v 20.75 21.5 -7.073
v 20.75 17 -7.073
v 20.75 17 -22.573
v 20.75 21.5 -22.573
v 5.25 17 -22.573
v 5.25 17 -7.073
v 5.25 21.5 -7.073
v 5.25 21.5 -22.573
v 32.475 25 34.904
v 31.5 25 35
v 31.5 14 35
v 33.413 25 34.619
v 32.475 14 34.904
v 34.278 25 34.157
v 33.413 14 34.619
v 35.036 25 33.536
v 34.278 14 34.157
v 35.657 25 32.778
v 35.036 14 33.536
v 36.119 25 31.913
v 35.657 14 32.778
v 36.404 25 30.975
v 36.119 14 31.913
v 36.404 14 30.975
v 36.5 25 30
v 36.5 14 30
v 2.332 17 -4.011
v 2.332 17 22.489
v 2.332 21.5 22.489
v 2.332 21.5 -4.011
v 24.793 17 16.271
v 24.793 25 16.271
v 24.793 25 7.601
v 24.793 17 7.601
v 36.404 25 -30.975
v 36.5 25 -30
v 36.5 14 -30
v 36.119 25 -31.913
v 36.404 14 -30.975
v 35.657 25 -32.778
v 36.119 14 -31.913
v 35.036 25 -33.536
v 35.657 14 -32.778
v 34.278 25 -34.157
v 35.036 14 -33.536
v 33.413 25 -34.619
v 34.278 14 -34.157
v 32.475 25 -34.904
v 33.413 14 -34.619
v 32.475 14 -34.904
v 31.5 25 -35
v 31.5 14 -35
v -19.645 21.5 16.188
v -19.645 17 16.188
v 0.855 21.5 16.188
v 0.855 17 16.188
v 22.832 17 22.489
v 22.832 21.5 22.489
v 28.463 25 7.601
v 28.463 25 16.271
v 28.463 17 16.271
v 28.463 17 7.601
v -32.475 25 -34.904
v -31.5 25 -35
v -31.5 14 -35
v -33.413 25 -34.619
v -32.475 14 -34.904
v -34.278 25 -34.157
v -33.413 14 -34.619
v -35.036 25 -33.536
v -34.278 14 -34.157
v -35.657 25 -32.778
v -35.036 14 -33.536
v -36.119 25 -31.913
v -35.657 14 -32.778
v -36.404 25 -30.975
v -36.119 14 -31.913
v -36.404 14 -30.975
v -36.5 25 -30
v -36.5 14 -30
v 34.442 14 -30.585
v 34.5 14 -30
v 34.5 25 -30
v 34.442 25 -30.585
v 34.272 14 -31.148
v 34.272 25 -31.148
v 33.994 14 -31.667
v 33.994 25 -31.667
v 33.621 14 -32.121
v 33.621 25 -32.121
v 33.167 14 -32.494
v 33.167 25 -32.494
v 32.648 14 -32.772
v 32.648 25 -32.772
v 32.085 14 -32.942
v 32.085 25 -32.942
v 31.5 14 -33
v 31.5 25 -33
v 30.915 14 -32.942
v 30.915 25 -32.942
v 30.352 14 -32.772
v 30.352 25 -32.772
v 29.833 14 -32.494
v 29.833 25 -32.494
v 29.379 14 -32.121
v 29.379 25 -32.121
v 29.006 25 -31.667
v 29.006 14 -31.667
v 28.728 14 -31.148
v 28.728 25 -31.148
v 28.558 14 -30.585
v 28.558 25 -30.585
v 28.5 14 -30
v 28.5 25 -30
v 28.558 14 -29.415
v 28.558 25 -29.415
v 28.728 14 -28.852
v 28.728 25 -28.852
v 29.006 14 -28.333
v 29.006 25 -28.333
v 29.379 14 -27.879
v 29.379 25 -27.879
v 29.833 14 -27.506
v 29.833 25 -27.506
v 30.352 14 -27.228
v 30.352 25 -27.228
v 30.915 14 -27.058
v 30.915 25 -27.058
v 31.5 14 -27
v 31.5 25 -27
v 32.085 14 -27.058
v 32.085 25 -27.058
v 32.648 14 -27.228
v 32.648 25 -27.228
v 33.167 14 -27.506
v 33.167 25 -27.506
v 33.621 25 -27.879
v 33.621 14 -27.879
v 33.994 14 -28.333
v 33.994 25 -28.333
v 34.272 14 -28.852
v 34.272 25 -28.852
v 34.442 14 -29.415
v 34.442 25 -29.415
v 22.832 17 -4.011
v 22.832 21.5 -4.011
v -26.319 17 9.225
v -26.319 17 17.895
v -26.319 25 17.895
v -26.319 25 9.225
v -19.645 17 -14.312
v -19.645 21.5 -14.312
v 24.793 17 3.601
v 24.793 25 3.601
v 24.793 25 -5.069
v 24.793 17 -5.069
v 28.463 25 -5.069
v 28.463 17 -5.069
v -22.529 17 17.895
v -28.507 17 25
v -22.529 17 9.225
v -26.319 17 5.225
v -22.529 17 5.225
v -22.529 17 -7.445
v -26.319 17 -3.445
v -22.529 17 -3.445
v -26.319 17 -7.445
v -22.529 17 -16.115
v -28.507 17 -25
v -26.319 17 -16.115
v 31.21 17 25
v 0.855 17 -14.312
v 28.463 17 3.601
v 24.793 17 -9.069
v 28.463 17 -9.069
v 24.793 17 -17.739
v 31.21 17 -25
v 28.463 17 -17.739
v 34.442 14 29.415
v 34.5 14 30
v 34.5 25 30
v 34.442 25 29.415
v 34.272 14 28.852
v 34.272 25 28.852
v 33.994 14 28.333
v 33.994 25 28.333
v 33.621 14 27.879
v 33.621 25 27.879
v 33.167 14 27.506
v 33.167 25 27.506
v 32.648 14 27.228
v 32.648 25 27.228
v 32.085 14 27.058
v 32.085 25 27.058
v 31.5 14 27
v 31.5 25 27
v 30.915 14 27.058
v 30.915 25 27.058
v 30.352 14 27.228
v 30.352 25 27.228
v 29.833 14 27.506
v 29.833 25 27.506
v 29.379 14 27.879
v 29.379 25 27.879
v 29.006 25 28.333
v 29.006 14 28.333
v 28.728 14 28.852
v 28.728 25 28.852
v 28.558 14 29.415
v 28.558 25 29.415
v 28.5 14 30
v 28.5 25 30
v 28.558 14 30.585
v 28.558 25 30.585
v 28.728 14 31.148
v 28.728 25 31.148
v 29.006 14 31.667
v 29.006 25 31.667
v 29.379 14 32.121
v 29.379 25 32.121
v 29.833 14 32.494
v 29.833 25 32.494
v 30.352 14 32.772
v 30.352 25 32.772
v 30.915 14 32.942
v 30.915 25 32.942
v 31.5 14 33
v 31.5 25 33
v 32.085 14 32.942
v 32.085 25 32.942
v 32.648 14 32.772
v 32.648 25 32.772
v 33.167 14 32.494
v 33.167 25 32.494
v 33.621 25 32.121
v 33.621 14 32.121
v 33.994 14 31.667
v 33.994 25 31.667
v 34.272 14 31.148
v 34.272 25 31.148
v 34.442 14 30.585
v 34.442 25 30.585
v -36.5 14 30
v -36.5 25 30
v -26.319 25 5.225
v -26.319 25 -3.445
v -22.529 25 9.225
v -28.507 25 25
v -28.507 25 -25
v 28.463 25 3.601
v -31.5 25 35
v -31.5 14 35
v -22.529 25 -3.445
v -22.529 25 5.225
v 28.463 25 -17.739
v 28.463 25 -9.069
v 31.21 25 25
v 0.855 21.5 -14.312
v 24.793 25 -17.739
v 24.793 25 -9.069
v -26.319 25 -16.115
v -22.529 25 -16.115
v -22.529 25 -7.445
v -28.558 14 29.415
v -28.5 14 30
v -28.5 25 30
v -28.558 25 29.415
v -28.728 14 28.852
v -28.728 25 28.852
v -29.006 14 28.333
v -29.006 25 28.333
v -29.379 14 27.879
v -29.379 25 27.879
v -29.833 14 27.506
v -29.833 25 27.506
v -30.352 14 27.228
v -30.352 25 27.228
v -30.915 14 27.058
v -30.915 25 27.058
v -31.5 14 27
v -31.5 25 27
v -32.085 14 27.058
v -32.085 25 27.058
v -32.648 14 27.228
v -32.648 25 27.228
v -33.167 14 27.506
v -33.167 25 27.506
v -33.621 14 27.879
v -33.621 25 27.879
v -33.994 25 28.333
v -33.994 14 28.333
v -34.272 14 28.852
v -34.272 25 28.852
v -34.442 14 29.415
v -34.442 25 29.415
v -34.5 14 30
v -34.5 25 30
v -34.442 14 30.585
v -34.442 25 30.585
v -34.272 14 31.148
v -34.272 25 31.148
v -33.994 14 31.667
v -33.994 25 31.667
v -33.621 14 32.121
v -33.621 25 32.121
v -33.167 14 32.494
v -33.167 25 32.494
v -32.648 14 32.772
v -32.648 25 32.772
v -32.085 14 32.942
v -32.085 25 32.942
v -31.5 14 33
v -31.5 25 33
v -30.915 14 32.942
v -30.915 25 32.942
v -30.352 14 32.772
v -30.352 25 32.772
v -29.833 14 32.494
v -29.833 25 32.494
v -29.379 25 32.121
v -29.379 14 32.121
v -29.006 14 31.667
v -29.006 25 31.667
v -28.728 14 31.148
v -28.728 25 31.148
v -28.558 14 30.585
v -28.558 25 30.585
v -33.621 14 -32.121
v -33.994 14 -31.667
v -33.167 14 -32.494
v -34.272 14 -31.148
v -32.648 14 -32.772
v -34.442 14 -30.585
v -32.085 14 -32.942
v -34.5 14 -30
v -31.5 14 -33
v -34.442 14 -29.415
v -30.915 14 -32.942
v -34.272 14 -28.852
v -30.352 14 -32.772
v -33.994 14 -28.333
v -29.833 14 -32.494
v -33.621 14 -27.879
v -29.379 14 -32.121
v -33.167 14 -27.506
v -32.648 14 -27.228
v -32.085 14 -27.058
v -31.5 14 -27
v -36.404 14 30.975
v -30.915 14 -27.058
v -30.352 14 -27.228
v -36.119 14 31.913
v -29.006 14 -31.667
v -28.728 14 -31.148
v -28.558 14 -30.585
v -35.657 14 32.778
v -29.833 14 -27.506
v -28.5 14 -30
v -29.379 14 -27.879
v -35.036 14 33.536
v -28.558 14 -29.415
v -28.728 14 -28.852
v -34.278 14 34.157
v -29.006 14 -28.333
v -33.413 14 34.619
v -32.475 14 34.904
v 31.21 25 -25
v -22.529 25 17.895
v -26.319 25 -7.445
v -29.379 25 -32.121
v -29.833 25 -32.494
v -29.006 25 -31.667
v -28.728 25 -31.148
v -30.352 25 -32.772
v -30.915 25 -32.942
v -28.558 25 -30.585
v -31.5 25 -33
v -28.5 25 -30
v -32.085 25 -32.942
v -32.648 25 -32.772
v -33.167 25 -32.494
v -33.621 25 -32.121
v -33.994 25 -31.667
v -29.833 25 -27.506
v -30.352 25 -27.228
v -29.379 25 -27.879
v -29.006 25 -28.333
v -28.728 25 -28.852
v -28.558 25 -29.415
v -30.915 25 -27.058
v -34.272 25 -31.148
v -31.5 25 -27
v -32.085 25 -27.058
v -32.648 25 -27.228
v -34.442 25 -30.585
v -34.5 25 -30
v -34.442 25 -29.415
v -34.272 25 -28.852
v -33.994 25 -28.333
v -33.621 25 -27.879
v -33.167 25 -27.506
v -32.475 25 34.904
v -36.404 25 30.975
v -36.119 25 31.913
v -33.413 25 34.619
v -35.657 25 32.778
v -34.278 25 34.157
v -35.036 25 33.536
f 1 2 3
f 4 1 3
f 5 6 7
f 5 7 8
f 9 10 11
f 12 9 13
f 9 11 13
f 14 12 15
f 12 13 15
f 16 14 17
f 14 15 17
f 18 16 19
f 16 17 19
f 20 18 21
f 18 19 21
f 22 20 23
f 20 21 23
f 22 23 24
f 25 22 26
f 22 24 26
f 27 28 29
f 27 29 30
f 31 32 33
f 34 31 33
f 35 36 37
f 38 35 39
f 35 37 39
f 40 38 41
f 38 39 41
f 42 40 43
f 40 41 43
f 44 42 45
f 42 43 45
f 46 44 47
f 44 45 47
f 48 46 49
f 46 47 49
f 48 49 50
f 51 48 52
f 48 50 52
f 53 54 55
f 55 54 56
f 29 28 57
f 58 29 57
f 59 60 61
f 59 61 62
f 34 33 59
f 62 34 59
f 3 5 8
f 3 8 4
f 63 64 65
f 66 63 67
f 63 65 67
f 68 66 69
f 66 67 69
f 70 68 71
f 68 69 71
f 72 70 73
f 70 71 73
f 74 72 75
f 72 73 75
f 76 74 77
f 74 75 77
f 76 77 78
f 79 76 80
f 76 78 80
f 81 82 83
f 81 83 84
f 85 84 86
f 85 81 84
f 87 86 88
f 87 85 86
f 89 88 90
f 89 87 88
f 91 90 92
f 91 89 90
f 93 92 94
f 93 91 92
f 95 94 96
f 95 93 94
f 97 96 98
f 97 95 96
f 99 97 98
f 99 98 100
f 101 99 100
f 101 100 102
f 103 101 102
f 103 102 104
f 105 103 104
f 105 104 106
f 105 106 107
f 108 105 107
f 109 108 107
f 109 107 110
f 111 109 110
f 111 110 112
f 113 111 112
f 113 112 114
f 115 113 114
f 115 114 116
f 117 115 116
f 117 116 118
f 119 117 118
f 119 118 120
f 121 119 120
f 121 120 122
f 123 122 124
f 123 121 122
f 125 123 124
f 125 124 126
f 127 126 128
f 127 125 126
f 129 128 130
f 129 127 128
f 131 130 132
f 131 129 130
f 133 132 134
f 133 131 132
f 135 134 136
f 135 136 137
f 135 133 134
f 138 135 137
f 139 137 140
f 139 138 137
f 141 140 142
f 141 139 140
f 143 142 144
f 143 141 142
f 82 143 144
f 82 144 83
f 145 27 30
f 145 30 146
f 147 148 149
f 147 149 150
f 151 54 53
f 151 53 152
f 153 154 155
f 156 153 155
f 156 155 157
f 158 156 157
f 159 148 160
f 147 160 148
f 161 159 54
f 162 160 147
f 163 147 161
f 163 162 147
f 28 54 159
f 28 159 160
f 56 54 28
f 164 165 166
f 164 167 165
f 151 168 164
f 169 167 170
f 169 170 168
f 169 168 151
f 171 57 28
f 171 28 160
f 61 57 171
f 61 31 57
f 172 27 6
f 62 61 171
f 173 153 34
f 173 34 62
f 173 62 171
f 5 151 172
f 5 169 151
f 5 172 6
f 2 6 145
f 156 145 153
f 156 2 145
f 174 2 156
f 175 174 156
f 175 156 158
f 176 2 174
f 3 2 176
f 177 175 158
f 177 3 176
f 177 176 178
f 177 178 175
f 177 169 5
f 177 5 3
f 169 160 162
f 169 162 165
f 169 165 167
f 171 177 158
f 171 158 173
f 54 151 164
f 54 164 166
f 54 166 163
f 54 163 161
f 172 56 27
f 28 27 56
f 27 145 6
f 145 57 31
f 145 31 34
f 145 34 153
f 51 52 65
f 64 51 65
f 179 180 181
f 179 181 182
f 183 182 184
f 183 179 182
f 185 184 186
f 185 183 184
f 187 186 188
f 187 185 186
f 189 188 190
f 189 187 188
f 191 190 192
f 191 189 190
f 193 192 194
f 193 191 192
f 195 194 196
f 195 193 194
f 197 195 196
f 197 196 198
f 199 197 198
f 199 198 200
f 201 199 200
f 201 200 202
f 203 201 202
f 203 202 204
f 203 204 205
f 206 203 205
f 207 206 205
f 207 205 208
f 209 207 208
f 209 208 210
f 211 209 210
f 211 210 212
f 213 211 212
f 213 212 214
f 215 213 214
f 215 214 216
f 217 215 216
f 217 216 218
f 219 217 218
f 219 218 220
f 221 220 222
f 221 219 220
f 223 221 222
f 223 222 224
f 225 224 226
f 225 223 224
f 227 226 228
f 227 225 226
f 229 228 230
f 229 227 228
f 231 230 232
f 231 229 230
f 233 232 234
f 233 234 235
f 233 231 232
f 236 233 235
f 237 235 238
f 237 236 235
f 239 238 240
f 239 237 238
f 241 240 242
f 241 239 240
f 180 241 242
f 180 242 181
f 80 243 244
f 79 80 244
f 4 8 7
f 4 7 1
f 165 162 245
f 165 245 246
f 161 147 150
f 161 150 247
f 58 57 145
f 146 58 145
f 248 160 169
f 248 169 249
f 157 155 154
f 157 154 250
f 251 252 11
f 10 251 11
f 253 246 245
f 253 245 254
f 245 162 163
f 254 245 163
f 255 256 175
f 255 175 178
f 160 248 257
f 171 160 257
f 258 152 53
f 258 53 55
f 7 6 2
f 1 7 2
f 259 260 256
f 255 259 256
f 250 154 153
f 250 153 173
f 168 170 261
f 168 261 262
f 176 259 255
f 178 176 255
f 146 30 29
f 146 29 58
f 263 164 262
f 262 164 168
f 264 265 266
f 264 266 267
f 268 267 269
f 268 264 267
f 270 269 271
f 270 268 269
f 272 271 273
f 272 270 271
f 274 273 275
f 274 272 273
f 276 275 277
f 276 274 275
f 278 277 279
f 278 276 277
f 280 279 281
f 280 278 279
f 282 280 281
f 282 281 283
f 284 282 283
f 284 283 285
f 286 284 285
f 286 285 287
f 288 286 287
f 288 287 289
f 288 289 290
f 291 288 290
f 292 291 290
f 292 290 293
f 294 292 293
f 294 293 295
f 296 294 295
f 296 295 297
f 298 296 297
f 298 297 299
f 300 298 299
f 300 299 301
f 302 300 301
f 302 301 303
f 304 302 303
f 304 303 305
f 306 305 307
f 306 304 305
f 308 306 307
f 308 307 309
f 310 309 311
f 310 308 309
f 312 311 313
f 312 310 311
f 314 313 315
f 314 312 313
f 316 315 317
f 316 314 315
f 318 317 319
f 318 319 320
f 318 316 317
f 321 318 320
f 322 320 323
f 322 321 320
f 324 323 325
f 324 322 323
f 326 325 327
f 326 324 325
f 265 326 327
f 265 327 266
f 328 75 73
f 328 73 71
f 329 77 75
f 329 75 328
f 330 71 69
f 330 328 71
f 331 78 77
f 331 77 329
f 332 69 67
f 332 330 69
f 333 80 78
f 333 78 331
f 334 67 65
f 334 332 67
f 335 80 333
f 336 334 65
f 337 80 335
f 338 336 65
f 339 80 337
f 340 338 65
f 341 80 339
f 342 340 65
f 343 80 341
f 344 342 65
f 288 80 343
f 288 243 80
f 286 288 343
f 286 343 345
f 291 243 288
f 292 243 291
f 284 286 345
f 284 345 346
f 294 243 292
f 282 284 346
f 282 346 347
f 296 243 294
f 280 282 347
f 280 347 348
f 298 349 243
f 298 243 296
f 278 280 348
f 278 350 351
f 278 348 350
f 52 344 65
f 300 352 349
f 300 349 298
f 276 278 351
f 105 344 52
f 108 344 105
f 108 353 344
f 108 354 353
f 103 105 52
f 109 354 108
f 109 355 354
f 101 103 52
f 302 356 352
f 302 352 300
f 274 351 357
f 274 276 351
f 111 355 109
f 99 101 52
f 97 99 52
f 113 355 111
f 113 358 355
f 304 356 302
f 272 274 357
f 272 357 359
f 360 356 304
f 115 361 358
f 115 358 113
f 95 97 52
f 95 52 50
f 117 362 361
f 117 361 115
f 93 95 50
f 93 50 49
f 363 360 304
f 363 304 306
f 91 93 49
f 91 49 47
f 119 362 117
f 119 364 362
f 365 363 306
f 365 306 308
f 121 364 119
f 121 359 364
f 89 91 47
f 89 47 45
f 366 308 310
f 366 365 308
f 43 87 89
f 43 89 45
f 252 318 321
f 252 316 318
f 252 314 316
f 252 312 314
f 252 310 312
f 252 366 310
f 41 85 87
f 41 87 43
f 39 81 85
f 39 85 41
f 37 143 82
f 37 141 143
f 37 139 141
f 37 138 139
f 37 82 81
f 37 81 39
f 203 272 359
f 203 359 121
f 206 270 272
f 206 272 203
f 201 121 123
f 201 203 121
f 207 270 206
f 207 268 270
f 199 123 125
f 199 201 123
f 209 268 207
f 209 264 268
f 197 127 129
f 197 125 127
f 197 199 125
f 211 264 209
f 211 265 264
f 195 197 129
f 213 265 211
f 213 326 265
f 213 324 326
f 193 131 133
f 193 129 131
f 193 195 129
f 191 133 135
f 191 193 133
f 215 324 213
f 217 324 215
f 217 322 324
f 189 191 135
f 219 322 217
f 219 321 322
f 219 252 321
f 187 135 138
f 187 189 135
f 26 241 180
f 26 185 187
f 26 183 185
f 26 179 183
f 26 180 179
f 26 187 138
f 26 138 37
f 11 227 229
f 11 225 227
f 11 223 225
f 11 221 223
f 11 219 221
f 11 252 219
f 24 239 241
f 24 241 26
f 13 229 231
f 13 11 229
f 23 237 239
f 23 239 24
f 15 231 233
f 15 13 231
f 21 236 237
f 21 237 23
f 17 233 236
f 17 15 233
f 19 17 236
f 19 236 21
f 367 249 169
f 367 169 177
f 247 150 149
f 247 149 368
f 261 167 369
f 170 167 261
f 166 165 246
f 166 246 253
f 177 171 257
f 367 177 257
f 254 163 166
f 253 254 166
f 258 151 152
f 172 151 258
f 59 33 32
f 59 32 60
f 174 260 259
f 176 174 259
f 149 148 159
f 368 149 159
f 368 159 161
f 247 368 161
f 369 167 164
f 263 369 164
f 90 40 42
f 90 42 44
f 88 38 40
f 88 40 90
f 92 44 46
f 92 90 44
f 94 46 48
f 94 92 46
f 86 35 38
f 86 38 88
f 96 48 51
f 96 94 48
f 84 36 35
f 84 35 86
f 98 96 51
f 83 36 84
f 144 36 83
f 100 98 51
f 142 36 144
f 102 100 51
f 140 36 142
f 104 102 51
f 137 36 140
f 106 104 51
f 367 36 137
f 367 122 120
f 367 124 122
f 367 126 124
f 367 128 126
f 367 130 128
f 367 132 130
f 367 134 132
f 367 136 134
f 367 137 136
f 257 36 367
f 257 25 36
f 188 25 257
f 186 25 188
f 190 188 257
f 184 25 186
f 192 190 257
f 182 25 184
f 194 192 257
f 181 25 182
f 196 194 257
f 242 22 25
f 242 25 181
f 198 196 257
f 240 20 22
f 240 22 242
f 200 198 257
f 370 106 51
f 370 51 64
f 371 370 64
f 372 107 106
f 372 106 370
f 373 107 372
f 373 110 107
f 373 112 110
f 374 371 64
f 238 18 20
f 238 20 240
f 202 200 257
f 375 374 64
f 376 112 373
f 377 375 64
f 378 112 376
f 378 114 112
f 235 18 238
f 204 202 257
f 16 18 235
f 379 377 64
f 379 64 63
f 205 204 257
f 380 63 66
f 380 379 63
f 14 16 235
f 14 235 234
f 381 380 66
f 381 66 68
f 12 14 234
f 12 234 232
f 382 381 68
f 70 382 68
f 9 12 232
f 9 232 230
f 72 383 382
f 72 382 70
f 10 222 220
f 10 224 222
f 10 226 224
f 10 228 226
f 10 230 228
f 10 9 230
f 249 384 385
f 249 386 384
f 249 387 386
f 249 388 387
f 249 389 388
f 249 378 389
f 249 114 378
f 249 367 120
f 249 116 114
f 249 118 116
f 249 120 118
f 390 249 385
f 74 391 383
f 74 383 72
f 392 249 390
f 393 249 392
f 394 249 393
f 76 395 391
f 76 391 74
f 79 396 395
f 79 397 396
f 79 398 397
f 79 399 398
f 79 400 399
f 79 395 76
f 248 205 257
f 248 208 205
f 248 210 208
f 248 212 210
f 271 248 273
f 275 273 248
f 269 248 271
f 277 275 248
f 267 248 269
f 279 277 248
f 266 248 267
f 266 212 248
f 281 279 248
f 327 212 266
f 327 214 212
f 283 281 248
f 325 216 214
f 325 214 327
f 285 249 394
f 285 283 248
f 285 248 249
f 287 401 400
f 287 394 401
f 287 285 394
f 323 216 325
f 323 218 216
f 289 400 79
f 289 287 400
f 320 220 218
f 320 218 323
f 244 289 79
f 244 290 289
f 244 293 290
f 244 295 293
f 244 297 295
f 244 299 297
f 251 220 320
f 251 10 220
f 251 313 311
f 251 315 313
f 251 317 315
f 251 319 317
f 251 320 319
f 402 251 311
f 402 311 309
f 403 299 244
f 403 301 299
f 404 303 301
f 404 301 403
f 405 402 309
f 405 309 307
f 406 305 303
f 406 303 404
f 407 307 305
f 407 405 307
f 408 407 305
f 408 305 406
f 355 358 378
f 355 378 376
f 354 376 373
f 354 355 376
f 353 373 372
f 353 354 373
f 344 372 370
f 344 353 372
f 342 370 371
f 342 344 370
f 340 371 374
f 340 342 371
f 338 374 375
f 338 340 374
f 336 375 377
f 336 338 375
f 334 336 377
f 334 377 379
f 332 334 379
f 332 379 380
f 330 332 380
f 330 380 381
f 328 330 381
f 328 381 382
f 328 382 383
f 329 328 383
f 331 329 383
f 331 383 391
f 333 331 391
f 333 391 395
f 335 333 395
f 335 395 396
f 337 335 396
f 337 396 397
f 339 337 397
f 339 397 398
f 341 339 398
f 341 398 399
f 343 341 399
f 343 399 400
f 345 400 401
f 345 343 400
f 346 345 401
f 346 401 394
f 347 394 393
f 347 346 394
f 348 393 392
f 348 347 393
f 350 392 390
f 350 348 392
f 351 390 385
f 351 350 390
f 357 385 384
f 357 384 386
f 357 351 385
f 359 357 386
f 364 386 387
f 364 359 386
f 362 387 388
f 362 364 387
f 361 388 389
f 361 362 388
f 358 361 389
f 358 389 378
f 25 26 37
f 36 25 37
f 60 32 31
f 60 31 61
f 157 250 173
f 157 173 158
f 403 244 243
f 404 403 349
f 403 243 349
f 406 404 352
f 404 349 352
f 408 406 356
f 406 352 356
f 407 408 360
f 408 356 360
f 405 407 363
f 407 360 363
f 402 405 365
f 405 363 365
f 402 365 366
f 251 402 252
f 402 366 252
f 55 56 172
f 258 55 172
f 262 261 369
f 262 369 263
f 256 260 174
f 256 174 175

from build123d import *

# Parameters (mm, degrees)
SKETCH2_R             = 3
BOSS_EXTRUDE1_DEPTH   = 25
SKETCH5_W             = 200
SKETCH5_H             = 50
CUT_EXTRUDE1_DEPTH    = 8
SKETCH9_W             = 20.5
SKETCH9_H             = 26.5
BATTERY_DEPTH         = 4.5
SKETCH8_W             = 15.5
SKETCH8_H             = 15.5
TEG_TOP_MIDDLE_DEPTH  = 4.5
SKETCH10_W            = 20.5
SKETCH10_H            = 30.5
POWPCB_NEXTBATT_DEPTH = 4.5
SKETCH12_W            = 247.875067181
SKETCH12_H            = 102.432022038
CUT_EXTRUDE2_DEPTH    = 14
SKETCH13_W            = 7.9930444
SKETCH13_H            = 8
SKETCH13_W_2          = 5.289616262
BOSS_EXTRUDE2_DEPTH   = 51
SKETCH14_W            = 3.79
SKETCH14_H            = 8.67
BOSS_EXTRUDE3_DEPTH   = 8
SKETCH15_W            = 3.67
SKETCH15_H            = 8.67
BOSS_EXTRUDE4_DEPTH   = 9


with BuildPart() as part:
    # Sketch2 → Boss-Extrude1 (new body)
    with BuildSketch(Plane(origin=(0, 0, 0), x_dir=(1, 0, 0), z_dir=(0, 1, 0))):
        with BuildLine():
            Line((-31.5, -35), (31.5, -35))
            ThreePointArc((31.5, -35), (35.035533906, -33.535533906), (36.5, -30))
            Line((36.5, -30), (36.5, 30))
            ThreePointArc((36.5, 30), (35.035533906, 33.535533906), (31.5, 35))
            Line((31.5, 35), (-31.5, 35))
            ThreePointArc((-31.5, 35), (-35.035533906, 33.535533906), (-36.5, 30))
            Line((-36.5, 30), (-36.5, -30))
            ThreePointArc((-36.5, -30), (-35.035533906, -33.535533906), (-31.5, -35))
        make_face()
        with Locations((-31.5, 30)):
            Circle(SKETCH2_R, mode=Mode.SUBTRACT)
        with Locations((-31.5, -30)):
            Circle(SKETCH2_R, mode=Mode.SUBTRACT)
        with Locations((31.5, 30)):
            Circle(SKETCH2_R, mode=Mode.SUBTRACT)
        with Locations((31.5, -30)):
            Circle(SKETCH2_R, mode=Mode.SUBTRACT)
    extrude(amount=BOSS_EXTRUDE1_DEPTH)

    # Sketch5 → Cut-Extrude1 (cut)
    with BuildSketch(Plane(origin=(0, 25, 0), x_dir=(1, 0, 0), z_dir=(0, 1, 0))):
        Rectangle(SKETCH5_W, SKETCH5_H)
    extrude(amount=-CUT_EXTRUDE1_DEPTH, mode=Mode.SUBTRACT)

    # Sketch9 → Battery (add)
    with BuildSketch(Plane(origin=(78.136647367, 17, 0), x_dir=(1, 0, 0), z_dir=(0, 1, 0))):
        with Locations((-65.5549825, -9.238518767)):
            Rectangle(SKETCH9_W, SKETCH9_H)
    extrude(amount=BATTERY_DEPTH)

    # Sketch8 → TEG(Top Middle) (add)
    with BuildSketch(Plane(origin=(0.095109107, 17, -16.130780733), x_dir=(1, 0, 0), z_dir=(0, 1, 0))):
        with Locations((12.905058884, -1.308244326)):
            Rectangle(SKETCH8_W, SKETCH8_H)
    extrude(amount=TEG_TOP_MIDDLE_DEPTH)

    # Sketch10 → PowPCB(nextbatt) (add)
    with BuildSketch(Plane(origin=(-57.874767331, 17, 5.938113267), x_dir=(1, 0, 0), z_dir=(0, 1, 0))):
        with Locations((48.479710494, 5)):
            Rectangle(SKETCH10_W, SKETCH10_H)
    extrude(amount=POWPCB_NEXTBATT_DEPTH)

    # Sketch12 → Cut-Extrude2 (cut)
    with BuildSketch(Plane.XZ):
        with Locations((-0.926975658, -6.36803857)):
            Rectangle(SKETCH12_W, SKETCH12_H)
    extrude(amount=-CUT_EXTRUDE2_DEPTH, mode=Mode.SUBTRACT)

    # Sketch13 → Boss-Extrude2 (add)
    with BuildSketch(Plane(origin=(0, 0, 25), x_dir=(-1, 0, 0), z_dir=(0, 0, -1))):
        with Locations((32.5034778, 21)):
            Rectangle(SKETCH13_W, SKETCH13_H)
        with Locations((-33.855191869, 21)):
            Rectangle(SKETCH13_W_2, SKETCH13_H)
    extrude(amount=BOSS_EXTRUDE2_DEPTH)

    # Sketch14 → Boss-Extrude3 (add)
    with BuildSketch(Plane(origin=(0, 17, 0), x_dir=(1, 0, 0), z_dir=(0, 1, 0))):
        with Locations((-24.424089145, -13.560130433)):
            Rectangle(SKETCH14_W, SKETCH14_H)
        with Locations((-24.424089145, 11.779869567)):
            Rectangle(SKETCH14_W, SKETCH14_H)
        with Locations((-24.424089145, -0.890130433)):
            Rectangle(SKETCH14_W, SKETCH14_H)
    extrude(amount=BOSS_EXTRUDE3_DEPTH)

    # Sketch15 → Boss-Extrude4 (add)
    with BuildSketch(Plane(origin=(49.484284455, 25, 12.830577775), x_dir=(1, 0, 0), z_dir=(0, 1, 0))):
        with Locations((-22.856133, 0.894138312)):
            Rectangle(SKETCH15_W, SKETCH15_H)
        with Locations((-22.856133, 26.234138312)):
            Rectangle(SKETCH15_W, SKETCH15_H)
        with Locations((-22.856133, 13.564138312)):
            Rectangle(SKETCH15_W, SKETCH15_H)
    extrude(amount=-BOSS_EXTRUDE4_DEPTH)


solid = part.part
